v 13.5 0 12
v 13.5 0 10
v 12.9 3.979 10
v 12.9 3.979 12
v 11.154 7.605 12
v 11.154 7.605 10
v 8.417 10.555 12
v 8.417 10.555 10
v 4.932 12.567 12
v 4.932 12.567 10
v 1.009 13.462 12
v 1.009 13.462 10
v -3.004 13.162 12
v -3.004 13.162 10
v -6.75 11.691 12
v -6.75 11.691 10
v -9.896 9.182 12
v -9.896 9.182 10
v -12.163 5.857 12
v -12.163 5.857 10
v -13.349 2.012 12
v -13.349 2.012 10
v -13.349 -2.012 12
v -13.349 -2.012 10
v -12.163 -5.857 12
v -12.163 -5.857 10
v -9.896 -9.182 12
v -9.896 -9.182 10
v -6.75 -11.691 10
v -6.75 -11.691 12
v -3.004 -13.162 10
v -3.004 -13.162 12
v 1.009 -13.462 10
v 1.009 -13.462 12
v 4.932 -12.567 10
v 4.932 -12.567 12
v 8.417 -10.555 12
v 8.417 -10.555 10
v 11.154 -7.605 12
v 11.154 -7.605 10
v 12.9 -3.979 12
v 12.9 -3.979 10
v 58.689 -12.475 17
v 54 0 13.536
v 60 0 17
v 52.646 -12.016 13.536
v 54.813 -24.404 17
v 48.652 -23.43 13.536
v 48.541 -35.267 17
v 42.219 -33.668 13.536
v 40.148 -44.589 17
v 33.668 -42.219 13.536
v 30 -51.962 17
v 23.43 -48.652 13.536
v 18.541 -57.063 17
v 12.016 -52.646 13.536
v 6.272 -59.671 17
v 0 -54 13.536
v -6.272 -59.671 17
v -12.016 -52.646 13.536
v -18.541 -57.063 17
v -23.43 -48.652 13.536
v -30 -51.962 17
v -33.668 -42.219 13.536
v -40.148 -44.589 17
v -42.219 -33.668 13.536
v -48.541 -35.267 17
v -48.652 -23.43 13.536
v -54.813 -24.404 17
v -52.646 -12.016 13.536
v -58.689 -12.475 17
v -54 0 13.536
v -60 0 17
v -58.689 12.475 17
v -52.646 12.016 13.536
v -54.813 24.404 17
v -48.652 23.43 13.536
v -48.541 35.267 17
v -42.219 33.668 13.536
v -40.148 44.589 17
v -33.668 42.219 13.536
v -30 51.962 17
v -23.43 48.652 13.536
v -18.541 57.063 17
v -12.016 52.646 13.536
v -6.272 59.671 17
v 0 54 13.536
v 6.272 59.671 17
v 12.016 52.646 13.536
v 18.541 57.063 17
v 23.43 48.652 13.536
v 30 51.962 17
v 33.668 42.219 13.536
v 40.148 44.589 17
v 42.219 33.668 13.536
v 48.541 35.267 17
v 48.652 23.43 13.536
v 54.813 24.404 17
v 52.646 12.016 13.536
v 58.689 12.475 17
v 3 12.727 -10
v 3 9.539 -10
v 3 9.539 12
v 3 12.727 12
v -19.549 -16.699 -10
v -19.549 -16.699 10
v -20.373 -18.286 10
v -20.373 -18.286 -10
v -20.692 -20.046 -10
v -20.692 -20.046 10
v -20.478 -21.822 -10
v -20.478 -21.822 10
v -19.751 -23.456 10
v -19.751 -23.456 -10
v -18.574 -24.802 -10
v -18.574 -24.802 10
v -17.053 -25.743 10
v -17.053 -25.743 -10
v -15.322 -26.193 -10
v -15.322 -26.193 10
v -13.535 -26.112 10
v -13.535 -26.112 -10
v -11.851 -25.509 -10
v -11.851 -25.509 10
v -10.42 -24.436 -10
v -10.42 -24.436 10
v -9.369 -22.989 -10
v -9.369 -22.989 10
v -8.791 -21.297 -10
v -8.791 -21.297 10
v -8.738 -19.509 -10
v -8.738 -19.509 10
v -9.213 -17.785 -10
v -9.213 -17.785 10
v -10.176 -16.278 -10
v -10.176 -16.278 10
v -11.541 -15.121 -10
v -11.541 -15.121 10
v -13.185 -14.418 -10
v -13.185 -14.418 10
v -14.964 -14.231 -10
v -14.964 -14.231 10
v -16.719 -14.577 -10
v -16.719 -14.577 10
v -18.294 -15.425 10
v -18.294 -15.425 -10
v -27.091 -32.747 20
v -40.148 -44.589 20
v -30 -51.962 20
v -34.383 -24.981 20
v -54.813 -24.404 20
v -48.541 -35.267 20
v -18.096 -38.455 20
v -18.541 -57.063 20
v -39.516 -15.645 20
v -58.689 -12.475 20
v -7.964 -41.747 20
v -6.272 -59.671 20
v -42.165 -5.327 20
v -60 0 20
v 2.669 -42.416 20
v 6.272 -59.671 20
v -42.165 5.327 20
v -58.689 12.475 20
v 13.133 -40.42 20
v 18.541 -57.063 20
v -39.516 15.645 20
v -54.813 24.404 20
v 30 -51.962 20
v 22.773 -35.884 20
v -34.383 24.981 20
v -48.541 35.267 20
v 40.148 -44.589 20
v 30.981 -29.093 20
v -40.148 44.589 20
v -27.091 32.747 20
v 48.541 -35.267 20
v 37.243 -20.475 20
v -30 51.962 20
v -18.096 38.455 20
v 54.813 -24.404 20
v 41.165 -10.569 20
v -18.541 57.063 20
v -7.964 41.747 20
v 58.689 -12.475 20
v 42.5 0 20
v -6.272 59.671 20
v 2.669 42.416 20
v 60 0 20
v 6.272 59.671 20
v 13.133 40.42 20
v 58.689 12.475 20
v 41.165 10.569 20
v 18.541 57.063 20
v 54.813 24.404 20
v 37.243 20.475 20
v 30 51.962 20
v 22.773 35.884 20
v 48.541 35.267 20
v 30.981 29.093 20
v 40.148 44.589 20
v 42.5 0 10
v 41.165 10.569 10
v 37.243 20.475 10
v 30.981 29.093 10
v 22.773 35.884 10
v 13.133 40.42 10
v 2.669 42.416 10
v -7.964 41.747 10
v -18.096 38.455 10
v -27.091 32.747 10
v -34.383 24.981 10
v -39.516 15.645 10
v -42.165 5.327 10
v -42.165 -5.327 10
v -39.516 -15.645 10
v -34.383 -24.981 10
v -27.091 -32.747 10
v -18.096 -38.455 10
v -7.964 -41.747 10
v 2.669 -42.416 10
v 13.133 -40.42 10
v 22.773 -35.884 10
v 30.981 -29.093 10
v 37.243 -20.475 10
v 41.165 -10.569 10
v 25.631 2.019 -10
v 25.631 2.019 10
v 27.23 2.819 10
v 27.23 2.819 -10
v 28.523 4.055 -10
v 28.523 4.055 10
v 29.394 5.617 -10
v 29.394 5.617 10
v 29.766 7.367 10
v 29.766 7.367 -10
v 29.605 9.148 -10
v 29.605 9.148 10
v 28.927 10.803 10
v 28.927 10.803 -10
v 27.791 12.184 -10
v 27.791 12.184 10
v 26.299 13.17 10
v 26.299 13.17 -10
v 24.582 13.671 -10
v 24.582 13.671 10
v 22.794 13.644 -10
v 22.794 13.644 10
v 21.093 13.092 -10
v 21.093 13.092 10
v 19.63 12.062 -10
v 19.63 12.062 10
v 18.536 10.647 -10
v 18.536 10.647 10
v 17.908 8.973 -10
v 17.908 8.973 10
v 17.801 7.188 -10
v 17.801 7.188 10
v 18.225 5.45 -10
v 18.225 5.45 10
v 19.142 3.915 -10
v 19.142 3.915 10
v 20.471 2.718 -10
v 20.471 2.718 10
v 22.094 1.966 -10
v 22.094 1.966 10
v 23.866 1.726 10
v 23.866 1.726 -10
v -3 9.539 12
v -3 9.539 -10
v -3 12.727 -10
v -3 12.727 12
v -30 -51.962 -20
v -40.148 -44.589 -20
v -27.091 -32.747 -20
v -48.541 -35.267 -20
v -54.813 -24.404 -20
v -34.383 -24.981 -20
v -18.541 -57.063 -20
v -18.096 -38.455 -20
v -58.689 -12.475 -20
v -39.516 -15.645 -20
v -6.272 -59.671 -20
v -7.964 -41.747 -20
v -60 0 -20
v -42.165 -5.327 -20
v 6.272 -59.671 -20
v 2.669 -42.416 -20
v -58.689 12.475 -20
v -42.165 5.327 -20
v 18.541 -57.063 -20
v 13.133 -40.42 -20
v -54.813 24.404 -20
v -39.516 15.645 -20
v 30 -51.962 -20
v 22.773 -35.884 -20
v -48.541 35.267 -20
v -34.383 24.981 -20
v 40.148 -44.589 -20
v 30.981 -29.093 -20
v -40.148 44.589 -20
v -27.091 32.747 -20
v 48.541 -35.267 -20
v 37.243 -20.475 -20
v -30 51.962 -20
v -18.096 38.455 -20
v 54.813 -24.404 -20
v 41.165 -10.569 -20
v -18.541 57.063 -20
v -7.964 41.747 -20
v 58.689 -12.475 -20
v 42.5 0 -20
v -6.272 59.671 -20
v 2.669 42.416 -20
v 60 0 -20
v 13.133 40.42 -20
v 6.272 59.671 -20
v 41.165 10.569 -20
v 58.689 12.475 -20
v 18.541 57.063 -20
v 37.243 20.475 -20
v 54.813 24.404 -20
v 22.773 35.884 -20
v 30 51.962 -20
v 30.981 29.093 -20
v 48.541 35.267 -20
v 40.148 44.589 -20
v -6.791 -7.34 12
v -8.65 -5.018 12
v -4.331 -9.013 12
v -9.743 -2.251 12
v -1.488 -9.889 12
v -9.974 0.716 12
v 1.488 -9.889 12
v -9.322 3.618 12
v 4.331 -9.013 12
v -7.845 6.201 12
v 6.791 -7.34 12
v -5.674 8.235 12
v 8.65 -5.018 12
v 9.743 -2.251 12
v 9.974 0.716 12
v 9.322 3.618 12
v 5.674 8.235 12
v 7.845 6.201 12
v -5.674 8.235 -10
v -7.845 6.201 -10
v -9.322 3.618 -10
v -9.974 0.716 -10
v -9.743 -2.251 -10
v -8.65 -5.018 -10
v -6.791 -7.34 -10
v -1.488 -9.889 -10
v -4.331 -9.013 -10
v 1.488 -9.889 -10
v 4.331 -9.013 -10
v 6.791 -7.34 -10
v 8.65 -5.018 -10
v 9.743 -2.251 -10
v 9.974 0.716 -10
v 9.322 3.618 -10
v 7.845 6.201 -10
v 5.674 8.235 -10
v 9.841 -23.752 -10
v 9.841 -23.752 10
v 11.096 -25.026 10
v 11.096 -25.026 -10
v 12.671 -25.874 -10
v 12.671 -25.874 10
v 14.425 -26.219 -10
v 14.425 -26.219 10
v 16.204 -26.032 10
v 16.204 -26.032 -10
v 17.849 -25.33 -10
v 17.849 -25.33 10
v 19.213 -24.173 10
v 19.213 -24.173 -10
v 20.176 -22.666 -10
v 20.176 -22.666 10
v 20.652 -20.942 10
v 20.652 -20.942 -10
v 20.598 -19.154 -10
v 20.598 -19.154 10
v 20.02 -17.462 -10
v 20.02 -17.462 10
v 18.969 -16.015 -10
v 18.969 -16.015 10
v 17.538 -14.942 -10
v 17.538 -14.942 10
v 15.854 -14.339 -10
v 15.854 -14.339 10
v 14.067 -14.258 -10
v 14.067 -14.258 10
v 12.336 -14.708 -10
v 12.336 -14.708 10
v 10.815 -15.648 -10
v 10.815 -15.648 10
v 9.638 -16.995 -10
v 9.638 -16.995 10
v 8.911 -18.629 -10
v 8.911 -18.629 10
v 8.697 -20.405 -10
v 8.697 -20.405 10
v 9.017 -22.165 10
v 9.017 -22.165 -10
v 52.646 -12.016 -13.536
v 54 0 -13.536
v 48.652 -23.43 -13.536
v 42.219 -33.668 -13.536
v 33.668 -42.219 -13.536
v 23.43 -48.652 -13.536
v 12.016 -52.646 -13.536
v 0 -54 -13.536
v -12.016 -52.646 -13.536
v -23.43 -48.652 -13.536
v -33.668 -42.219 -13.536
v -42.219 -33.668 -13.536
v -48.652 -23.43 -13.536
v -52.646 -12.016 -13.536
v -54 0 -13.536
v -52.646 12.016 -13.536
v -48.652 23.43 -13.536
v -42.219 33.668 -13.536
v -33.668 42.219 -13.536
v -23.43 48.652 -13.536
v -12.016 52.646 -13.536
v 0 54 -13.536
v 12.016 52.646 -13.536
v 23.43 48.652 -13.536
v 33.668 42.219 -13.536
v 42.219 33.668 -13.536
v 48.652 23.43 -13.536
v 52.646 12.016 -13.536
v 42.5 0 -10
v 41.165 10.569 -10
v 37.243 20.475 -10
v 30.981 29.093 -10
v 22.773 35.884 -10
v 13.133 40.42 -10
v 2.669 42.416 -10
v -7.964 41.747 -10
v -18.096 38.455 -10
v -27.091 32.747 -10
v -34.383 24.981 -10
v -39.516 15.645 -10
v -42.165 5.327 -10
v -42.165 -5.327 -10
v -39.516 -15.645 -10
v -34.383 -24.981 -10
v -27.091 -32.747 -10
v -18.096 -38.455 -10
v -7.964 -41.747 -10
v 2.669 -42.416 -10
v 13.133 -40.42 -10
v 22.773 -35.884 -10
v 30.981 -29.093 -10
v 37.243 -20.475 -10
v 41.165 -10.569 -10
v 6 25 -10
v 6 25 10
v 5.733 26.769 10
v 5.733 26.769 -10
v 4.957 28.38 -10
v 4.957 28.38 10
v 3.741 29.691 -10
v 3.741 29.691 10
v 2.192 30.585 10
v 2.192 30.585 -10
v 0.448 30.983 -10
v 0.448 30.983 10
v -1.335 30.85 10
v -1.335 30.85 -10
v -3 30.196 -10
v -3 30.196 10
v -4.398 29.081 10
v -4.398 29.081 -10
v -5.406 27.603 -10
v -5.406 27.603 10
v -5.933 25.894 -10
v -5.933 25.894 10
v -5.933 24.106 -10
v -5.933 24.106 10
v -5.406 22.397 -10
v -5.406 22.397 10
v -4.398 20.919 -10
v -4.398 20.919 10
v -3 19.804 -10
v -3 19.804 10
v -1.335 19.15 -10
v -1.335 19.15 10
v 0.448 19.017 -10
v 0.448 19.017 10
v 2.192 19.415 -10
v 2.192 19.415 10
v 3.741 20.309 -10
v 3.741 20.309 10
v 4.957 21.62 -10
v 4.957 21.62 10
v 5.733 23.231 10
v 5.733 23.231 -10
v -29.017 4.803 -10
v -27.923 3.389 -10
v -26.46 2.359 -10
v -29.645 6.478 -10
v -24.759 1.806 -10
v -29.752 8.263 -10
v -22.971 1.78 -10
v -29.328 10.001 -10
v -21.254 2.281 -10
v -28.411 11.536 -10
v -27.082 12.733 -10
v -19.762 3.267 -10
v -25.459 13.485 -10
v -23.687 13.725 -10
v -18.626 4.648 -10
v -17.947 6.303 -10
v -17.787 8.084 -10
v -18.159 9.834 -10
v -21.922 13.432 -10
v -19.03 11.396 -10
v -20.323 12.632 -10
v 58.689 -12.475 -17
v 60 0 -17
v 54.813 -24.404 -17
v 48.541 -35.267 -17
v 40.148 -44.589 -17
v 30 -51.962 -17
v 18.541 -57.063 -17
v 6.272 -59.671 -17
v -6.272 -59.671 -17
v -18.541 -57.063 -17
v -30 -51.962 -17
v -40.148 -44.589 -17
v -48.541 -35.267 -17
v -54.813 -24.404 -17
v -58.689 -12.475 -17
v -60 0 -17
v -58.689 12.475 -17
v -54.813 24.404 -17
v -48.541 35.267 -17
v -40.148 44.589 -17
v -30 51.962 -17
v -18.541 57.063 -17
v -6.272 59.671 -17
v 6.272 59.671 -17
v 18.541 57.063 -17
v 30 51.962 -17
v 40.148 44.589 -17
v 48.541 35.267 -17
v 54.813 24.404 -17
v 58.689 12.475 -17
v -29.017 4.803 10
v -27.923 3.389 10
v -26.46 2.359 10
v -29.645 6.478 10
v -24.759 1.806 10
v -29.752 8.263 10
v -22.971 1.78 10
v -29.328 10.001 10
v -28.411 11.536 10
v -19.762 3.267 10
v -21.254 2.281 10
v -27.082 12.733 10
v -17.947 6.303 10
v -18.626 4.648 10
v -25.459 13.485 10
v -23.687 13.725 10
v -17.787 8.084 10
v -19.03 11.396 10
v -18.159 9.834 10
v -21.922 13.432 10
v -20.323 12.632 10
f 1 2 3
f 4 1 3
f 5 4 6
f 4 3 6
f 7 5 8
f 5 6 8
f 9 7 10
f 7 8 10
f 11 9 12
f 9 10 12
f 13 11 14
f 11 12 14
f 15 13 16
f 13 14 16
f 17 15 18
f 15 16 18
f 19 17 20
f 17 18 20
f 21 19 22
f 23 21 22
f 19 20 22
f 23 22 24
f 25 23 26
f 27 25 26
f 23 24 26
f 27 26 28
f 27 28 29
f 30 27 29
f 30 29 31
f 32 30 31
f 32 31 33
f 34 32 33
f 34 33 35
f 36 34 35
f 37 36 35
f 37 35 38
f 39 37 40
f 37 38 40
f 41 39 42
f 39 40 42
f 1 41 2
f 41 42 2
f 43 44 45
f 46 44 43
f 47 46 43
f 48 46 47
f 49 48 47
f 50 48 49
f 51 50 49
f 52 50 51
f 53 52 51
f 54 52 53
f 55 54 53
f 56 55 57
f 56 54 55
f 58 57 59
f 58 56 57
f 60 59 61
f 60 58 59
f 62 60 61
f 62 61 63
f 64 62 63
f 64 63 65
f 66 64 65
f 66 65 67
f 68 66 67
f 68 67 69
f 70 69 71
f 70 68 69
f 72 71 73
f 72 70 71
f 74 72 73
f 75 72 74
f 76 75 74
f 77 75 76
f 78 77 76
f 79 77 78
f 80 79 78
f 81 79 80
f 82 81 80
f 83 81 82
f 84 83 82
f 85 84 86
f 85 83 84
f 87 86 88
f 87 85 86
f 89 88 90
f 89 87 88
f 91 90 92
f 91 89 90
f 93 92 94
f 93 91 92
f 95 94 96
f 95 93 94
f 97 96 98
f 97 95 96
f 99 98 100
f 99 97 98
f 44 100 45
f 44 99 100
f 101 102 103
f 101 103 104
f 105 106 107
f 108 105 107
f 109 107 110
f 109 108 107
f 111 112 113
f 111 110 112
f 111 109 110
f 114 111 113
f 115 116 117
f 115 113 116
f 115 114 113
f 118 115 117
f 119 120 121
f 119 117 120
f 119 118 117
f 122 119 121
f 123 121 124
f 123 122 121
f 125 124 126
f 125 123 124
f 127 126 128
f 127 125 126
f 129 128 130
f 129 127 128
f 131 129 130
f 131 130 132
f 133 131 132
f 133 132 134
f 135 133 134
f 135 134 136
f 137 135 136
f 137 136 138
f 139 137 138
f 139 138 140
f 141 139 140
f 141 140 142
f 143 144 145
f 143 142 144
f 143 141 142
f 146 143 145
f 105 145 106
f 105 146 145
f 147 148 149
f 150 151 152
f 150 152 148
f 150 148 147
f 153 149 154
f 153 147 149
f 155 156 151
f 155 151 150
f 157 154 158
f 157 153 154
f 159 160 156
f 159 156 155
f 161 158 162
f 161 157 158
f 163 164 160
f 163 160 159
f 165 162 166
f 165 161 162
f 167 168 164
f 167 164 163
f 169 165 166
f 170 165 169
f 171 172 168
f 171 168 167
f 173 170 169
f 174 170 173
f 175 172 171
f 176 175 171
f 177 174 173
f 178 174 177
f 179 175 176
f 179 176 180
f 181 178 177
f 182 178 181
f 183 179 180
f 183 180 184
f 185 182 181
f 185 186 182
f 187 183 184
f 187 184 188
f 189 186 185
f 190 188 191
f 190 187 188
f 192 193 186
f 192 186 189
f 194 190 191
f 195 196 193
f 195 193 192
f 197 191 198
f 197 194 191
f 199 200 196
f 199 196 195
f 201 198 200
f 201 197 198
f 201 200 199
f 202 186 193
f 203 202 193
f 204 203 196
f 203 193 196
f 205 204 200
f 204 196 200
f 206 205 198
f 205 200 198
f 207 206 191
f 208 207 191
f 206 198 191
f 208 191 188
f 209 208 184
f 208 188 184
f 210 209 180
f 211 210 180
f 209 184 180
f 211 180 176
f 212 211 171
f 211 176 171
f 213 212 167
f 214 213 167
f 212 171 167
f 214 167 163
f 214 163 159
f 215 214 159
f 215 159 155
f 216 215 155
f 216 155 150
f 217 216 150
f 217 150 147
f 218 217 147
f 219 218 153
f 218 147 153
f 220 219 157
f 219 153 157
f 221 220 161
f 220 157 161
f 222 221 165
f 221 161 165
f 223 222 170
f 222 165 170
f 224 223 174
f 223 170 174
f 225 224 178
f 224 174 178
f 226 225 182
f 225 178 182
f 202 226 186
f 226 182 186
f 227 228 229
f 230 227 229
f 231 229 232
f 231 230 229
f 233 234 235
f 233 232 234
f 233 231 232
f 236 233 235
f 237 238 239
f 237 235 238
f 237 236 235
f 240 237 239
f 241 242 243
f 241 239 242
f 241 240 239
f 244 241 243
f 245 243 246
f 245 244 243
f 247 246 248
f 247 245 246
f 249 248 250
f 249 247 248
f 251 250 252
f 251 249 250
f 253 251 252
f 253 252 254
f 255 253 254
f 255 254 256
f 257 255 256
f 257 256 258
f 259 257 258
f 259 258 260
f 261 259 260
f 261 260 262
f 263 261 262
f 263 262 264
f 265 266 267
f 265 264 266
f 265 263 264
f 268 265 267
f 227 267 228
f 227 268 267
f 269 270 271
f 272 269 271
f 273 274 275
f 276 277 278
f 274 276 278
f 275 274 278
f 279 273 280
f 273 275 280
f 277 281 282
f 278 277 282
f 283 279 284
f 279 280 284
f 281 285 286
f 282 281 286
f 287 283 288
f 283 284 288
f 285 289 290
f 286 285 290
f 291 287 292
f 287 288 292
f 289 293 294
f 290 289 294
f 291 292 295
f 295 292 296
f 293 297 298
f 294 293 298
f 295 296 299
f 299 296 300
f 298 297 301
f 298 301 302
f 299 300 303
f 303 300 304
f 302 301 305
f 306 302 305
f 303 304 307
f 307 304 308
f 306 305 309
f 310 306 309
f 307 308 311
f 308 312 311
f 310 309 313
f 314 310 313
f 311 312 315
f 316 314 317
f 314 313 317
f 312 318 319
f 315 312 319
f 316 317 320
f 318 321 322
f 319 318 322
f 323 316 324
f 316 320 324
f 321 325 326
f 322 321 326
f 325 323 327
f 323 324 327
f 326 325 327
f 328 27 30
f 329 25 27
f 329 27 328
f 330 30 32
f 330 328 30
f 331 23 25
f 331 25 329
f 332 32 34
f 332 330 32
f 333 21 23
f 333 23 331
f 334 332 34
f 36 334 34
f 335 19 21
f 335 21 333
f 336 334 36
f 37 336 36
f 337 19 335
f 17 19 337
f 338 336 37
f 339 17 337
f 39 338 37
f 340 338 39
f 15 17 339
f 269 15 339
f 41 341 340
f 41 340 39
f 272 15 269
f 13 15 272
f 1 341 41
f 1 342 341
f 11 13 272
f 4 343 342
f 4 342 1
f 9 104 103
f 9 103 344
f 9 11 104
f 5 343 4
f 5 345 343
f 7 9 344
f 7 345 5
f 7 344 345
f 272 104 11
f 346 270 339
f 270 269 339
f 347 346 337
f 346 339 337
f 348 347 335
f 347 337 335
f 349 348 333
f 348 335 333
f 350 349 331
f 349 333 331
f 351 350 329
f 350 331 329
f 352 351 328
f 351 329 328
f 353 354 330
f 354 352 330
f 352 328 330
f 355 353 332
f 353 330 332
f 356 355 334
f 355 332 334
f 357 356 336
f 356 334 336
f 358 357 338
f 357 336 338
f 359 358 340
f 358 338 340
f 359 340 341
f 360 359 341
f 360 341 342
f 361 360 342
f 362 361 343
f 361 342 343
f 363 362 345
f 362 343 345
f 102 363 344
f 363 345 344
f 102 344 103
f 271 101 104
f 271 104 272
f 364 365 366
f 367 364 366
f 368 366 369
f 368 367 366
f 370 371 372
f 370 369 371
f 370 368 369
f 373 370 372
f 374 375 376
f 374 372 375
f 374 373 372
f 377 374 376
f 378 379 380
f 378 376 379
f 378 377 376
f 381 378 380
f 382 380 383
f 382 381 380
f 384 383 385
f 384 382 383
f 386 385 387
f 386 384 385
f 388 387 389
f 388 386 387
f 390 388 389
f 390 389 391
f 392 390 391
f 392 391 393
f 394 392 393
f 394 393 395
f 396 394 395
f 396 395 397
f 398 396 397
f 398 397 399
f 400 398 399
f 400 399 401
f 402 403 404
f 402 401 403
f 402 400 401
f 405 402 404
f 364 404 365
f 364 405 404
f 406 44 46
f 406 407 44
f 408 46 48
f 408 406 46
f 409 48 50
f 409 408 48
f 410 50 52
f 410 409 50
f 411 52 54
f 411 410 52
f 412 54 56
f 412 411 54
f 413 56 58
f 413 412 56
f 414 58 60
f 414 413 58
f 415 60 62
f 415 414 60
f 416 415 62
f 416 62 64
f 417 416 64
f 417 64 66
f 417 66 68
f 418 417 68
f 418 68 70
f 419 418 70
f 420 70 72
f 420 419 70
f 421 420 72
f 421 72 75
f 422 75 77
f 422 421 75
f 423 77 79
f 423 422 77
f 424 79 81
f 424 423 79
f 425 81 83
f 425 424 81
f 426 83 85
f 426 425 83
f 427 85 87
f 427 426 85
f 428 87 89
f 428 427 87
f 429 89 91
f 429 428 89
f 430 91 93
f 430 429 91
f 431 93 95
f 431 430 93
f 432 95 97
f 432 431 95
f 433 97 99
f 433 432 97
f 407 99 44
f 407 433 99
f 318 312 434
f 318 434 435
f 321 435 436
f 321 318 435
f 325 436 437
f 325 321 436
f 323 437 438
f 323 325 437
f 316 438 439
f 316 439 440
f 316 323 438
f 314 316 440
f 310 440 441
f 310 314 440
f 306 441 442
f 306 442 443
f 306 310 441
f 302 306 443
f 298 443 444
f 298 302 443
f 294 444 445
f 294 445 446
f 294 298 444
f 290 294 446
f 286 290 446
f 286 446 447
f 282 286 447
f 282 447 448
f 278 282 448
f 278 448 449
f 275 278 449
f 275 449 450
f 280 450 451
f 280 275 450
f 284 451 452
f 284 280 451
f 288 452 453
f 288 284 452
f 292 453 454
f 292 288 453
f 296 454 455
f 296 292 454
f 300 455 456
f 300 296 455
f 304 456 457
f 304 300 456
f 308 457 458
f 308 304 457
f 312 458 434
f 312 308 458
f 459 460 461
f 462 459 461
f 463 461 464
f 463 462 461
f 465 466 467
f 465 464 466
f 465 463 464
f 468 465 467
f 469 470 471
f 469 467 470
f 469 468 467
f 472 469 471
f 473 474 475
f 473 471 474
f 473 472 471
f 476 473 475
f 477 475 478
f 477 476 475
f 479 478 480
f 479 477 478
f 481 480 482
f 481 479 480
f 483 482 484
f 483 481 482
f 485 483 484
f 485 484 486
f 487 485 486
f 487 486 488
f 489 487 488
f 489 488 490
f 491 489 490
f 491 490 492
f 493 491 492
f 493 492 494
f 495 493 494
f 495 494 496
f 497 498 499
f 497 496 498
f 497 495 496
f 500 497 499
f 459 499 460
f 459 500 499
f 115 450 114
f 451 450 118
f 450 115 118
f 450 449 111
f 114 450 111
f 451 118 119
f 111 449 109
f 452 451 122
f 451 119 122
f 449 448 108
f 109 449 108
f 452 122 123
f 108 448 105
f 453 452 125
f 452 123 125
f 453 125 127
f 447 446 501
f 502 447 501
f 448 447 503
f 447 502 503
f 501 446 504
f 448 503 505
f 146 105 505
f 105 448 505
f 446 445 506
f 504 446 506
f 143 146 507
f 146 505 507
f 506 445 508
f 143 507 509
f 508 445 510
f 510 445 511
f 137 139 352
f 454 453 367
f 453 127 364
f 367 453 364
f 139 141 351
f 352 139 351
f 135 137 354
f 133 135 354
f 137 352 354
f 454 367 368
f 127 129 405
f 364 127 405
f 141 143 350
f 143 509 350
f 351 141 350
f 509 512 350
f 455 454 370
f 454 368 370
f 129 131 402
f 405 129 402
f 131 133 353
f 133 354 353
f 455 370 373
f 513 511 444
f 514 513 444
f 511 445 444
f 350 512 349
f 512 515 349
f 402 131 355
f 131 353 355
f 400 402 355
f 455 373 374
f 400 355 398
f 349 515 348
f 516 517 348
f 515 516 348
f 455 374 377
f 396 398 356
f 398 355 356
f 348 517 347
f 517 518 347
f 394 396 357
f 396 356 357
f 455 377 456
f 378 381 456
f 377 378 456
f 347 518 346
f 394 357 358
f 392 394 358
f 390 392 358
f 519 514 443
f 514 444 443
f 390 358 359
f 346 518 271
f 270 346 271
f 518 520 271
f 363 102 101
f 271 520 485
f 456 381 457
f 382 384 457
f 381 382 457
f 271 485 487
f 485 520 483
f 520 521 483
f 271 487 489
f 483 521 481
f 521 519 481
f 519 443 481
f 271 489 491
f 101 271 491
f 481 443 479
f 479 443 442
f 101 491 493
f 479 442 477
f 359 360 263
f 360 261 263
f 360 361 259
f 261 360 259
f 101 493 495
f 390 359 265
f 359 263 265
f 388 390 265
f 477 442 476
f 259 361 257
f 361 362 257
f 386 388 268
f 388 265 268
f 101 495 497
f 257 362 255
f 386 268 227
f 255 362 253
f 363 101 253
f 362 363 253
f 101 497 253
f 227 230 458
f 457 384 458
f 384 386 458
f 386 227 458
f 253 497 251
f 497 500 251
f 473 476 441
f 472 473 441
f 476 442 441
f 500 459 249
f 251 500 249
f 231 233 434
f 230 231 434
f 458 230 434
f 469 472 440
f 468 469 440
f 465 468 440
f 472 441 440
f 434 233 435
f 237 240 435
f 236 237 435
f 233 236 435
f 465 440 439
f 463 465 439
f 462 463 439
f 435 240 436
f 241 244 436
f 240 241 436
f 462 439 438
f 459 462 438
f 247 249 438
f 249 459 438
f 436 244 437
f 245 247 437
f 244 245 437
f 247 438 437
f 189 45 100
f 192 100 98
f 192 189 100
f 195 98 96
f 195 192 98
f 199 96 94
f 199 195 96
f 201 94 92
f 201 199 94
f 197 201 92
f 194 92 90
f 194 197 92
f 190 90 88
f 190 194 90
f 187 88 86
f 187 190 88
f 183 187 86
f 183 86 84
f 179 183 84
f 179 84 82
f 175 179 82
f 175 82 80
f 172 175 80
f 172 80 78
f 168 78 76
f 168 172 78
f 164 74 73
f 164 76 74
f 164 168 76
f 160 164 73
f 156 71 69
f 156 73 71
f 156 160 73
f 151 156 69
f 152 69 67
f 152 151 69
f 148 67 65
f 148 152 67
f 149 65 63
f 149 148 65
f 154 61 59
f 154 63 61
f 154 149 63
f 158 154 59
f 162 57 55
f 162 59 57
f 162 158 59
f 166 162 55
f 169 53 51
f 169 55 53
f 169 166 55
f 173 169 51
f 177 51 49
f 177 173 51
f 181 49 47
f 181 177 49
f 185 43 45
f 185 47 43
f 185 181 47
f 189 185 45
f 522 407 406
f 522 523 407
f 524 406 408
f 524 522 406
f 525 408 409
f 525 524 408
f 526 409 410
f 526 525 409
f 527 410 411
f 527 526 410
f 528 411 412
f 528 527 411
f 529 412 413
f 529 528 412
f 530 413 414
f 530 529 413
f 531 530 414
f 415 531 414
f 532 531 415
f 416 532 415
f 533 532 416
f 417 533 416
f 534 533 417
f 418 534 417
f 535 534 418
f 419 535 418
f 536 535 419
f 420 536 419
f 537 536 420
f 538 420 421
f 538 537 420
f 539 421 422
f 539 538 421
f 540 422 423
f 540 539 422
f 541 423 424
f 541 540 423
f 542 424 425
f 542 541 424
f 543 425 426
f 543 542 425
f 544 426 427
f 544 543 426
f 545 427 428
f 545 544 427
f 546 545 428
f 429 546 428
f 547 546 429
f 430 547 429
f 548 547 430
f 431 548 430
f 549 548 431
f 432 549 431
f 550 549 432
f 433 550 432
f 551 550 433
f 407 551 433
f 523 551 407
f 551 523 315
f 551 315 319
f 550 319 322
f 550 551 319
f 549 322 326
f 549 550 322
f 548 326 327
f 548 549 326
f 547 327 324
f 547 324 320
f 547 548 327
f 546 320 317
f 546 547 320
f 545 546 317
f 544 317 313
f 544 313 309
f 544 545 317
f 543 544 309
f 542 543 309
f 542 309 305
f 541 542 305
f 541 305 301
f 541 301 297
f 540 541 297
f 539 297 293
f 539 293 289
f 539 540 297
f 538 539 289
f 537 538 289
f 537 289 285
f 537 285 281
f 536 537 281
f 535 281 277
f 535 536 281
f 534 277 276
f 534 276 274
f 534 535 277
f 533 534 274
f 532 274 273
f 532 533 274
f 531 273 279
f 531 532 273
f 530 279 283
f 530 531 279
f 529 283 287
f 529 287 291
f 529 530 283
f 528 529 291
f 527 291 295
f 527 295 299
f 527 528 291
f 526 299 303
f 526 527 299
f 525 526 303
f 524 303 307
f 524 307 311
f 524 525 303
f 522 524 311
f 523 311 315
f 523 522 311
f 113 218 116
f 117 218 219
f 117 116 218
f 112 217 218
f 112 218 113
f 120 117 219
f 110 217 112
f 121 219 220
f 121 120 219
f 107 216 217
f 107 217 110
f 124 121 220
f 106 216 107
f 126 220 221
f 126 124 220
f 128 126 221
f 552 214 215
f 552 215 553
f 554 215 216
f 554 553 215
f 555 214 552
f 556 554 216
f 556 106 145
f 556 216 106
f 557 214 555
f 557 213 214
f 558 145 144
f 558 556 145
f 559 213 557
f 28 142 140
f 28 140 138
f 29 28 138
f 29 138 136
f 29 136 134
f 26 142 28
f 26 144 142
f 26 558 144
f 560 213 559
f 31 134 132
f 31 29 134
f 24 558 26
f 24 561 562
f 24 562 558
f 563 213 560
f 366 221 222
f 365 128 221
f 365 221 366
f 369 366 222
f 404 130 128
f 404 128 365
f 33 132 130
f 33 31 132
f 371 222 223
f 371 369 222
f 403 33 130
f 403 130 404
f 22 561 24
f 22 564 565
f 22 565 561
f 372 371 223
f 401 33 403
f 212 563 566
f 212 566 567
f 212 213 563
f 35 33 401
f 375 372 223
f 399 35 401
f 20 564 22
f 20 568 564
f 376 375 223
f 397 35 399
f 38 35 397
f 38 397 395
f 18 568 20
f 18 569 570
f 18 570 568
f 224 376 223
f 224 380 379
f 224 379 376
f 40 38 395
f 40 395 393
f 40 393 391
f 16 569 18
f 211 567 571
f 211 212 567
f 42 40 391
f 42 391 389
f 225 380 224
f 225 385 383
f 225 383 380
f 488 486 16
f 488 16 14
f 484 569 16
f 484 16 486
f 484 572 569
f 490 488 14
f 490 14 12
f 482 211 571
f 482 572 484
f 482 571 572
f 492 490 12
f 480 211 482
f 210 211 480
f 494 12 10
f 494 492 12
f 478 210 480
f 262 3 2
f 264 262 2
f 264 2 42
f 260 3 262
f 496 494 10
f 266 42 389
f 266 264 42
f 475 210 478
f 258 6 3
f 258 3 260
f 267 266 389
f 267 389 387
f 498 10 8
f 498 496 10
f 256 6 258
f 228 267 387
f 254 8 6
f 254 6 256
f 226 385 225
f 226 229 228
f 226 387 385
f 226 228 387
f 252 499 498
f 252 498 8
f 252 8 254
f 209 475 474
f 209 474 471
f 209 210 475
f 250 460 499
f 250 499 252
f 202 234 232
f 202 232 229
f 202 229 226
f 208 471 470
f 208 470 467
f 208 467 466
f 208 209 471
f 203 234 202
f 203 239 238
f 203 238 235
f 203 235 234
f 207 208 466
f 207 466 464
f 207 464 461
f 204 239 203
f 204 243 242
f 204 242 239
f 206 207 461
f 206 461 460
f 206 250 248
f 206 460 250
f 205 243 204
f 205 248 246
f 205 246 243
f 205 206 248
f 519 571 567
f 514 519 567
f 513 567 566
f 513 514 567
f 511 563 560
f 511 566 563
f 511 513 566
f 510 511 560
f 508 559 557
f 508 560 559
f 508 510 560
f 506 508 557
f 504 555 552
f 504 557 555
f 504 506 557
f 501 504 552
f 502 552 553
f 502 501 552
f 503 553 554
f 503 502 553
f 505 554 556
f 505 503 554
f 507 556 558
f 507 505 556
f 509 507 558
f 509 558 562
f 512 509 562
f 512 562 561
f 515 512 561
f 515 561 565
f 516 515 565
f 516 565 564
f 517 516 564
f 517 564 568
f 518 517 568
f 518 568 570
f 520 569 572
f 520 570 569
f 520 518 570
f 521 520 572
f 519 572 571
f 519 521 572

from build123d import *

# Parameters (mm, degrees)
SKETCH2_R                = 60
SKETCH2_R_2              = 10
BOSS_EXTRUDE1_DEPTH      = 20
SKETCH3_R                = 42.5
CUT_EXTRUDE1_DEPTH       = 10
CUT_EXTRUDE2_START       = -31
SKETCH4_R                = 6
CUT_EXTRUDE2_DEPTH       = 42
CIRPATTERN2_COUNT        = 5
SKETCH6_R                = 13.5
SKETCH6_R_2              = 10
BOSS_EXTRUDE3_DEPTH      = 2
BOSS_EXTRUDE3_DEPTH_BACK = 7
SKETCH8_W                = 6
SKETCH8_H                = 3.21
CUT_EXTRUDE3_DEPTH       = 11
CUT_EXTRUDE3_DEPTH_BACK  = 31


with BuildPart() as part:
    # Sketch2 → Boss-Extrude1 (new body, symmetric)
    with BuildSketch(Plane.XY):
        Circle(SKETCH2_R)
        Circle(SKETCH2_R_2, mode=Mode.SUBTRACT)
    extrude(amount=BOSS_EXTRUDE1_DEPTH, both=True)

    # Sketch3 → Cut-Extrude1 (cut)
    with BuildSketch(Plane.XY.offset(20)):
        Circle(SKETCH3_R)
    cut_extrude1 = extrude(amount=-CUT_EXTRUDE1_DEPTH, mode=Mode.SUBTRACT)

    # Mirror2: Cut-Extrude1 across plane
    add(cut_extrude1.mirror(Plane.XY), mode=Mode.SUBTRACT)

    # Sketch4 → Cut-Extrude2 (cut)
    with BuildSketch(Plane.XY.offset(10).offset(CUT_EXTRUDE2_START)):
        with Locations((0, 25)):
            Circle(SKETCH4_R)
    cut_extrude2 = extrude(amount=CUT_EXTRUDE2_DEPTH, mode=Mode.SUBTRACT)

    # CirPattern2: Cut-Extrude2 ×5 about axis
    cirpattern2_axis = Axis((0, 0, 0), (0, 0, 1))
    for i in range(1, CIRPATTERN2_COUNT):
        add(cut_extrude2.rotate(cirpattern2_axis, i * 360 / CIRPATTERN2_COUNT), mode=Mode.SUBTRACT)

    # Sketch5 → Cut-Revolve1 (revolve, cut)
    with BuildSketch(Plane(origin=(0, 0, 0), x_dir=(1, 0, 0), z_dir=(0, 1, 0))):
        Polygon((54, 13.535898385), (60, 17), (60, -17), (54, -13.535898385), align=None)
    revolve(axis=Axis((0, 0, 0), (0, 0, -1)), mode=Mode.SUBTRACT)

    # Sketch6 → Boss-Extrude3 (add, two sides)
    with BuildSketch(Plane.XY.offset(10)) as boss_extrude3_sk:
        Circle(SKETCH6_R)
        Circle(SKETCH6_R_2, mode=Mode.SUBTRACT)
    extrude(amount=BOSS_EXTRUDE3_DEPTH)
    extrude(boss_extrude3_sk.sketch, amount=-BOSS_EXTRUDE3_DEPTH_BACK)

    # Sketch8 → Cut-Extrude3 (cut, two sides)
    with BuildSketch(Plane(origin=(0, 0, -10), x_dir=(-1, 0, 0), z_dir=(0, 0, -1))) as cut_extrude3_sk:
        with Locations((0, 11.121882551)):
            Rectangle(SKETCH8_W, SKETCH8_H)
    extrude(amount=CUT_EXTRUDE3_DEPTH, mode=Mode.SUBTRACT)
    extrude(cut_extrude3_sk.sketch, amount=-CUT_EXTRUDE3_DEPTH_BACK, mode=Mode.SUBTRACT)


solid = part.part
